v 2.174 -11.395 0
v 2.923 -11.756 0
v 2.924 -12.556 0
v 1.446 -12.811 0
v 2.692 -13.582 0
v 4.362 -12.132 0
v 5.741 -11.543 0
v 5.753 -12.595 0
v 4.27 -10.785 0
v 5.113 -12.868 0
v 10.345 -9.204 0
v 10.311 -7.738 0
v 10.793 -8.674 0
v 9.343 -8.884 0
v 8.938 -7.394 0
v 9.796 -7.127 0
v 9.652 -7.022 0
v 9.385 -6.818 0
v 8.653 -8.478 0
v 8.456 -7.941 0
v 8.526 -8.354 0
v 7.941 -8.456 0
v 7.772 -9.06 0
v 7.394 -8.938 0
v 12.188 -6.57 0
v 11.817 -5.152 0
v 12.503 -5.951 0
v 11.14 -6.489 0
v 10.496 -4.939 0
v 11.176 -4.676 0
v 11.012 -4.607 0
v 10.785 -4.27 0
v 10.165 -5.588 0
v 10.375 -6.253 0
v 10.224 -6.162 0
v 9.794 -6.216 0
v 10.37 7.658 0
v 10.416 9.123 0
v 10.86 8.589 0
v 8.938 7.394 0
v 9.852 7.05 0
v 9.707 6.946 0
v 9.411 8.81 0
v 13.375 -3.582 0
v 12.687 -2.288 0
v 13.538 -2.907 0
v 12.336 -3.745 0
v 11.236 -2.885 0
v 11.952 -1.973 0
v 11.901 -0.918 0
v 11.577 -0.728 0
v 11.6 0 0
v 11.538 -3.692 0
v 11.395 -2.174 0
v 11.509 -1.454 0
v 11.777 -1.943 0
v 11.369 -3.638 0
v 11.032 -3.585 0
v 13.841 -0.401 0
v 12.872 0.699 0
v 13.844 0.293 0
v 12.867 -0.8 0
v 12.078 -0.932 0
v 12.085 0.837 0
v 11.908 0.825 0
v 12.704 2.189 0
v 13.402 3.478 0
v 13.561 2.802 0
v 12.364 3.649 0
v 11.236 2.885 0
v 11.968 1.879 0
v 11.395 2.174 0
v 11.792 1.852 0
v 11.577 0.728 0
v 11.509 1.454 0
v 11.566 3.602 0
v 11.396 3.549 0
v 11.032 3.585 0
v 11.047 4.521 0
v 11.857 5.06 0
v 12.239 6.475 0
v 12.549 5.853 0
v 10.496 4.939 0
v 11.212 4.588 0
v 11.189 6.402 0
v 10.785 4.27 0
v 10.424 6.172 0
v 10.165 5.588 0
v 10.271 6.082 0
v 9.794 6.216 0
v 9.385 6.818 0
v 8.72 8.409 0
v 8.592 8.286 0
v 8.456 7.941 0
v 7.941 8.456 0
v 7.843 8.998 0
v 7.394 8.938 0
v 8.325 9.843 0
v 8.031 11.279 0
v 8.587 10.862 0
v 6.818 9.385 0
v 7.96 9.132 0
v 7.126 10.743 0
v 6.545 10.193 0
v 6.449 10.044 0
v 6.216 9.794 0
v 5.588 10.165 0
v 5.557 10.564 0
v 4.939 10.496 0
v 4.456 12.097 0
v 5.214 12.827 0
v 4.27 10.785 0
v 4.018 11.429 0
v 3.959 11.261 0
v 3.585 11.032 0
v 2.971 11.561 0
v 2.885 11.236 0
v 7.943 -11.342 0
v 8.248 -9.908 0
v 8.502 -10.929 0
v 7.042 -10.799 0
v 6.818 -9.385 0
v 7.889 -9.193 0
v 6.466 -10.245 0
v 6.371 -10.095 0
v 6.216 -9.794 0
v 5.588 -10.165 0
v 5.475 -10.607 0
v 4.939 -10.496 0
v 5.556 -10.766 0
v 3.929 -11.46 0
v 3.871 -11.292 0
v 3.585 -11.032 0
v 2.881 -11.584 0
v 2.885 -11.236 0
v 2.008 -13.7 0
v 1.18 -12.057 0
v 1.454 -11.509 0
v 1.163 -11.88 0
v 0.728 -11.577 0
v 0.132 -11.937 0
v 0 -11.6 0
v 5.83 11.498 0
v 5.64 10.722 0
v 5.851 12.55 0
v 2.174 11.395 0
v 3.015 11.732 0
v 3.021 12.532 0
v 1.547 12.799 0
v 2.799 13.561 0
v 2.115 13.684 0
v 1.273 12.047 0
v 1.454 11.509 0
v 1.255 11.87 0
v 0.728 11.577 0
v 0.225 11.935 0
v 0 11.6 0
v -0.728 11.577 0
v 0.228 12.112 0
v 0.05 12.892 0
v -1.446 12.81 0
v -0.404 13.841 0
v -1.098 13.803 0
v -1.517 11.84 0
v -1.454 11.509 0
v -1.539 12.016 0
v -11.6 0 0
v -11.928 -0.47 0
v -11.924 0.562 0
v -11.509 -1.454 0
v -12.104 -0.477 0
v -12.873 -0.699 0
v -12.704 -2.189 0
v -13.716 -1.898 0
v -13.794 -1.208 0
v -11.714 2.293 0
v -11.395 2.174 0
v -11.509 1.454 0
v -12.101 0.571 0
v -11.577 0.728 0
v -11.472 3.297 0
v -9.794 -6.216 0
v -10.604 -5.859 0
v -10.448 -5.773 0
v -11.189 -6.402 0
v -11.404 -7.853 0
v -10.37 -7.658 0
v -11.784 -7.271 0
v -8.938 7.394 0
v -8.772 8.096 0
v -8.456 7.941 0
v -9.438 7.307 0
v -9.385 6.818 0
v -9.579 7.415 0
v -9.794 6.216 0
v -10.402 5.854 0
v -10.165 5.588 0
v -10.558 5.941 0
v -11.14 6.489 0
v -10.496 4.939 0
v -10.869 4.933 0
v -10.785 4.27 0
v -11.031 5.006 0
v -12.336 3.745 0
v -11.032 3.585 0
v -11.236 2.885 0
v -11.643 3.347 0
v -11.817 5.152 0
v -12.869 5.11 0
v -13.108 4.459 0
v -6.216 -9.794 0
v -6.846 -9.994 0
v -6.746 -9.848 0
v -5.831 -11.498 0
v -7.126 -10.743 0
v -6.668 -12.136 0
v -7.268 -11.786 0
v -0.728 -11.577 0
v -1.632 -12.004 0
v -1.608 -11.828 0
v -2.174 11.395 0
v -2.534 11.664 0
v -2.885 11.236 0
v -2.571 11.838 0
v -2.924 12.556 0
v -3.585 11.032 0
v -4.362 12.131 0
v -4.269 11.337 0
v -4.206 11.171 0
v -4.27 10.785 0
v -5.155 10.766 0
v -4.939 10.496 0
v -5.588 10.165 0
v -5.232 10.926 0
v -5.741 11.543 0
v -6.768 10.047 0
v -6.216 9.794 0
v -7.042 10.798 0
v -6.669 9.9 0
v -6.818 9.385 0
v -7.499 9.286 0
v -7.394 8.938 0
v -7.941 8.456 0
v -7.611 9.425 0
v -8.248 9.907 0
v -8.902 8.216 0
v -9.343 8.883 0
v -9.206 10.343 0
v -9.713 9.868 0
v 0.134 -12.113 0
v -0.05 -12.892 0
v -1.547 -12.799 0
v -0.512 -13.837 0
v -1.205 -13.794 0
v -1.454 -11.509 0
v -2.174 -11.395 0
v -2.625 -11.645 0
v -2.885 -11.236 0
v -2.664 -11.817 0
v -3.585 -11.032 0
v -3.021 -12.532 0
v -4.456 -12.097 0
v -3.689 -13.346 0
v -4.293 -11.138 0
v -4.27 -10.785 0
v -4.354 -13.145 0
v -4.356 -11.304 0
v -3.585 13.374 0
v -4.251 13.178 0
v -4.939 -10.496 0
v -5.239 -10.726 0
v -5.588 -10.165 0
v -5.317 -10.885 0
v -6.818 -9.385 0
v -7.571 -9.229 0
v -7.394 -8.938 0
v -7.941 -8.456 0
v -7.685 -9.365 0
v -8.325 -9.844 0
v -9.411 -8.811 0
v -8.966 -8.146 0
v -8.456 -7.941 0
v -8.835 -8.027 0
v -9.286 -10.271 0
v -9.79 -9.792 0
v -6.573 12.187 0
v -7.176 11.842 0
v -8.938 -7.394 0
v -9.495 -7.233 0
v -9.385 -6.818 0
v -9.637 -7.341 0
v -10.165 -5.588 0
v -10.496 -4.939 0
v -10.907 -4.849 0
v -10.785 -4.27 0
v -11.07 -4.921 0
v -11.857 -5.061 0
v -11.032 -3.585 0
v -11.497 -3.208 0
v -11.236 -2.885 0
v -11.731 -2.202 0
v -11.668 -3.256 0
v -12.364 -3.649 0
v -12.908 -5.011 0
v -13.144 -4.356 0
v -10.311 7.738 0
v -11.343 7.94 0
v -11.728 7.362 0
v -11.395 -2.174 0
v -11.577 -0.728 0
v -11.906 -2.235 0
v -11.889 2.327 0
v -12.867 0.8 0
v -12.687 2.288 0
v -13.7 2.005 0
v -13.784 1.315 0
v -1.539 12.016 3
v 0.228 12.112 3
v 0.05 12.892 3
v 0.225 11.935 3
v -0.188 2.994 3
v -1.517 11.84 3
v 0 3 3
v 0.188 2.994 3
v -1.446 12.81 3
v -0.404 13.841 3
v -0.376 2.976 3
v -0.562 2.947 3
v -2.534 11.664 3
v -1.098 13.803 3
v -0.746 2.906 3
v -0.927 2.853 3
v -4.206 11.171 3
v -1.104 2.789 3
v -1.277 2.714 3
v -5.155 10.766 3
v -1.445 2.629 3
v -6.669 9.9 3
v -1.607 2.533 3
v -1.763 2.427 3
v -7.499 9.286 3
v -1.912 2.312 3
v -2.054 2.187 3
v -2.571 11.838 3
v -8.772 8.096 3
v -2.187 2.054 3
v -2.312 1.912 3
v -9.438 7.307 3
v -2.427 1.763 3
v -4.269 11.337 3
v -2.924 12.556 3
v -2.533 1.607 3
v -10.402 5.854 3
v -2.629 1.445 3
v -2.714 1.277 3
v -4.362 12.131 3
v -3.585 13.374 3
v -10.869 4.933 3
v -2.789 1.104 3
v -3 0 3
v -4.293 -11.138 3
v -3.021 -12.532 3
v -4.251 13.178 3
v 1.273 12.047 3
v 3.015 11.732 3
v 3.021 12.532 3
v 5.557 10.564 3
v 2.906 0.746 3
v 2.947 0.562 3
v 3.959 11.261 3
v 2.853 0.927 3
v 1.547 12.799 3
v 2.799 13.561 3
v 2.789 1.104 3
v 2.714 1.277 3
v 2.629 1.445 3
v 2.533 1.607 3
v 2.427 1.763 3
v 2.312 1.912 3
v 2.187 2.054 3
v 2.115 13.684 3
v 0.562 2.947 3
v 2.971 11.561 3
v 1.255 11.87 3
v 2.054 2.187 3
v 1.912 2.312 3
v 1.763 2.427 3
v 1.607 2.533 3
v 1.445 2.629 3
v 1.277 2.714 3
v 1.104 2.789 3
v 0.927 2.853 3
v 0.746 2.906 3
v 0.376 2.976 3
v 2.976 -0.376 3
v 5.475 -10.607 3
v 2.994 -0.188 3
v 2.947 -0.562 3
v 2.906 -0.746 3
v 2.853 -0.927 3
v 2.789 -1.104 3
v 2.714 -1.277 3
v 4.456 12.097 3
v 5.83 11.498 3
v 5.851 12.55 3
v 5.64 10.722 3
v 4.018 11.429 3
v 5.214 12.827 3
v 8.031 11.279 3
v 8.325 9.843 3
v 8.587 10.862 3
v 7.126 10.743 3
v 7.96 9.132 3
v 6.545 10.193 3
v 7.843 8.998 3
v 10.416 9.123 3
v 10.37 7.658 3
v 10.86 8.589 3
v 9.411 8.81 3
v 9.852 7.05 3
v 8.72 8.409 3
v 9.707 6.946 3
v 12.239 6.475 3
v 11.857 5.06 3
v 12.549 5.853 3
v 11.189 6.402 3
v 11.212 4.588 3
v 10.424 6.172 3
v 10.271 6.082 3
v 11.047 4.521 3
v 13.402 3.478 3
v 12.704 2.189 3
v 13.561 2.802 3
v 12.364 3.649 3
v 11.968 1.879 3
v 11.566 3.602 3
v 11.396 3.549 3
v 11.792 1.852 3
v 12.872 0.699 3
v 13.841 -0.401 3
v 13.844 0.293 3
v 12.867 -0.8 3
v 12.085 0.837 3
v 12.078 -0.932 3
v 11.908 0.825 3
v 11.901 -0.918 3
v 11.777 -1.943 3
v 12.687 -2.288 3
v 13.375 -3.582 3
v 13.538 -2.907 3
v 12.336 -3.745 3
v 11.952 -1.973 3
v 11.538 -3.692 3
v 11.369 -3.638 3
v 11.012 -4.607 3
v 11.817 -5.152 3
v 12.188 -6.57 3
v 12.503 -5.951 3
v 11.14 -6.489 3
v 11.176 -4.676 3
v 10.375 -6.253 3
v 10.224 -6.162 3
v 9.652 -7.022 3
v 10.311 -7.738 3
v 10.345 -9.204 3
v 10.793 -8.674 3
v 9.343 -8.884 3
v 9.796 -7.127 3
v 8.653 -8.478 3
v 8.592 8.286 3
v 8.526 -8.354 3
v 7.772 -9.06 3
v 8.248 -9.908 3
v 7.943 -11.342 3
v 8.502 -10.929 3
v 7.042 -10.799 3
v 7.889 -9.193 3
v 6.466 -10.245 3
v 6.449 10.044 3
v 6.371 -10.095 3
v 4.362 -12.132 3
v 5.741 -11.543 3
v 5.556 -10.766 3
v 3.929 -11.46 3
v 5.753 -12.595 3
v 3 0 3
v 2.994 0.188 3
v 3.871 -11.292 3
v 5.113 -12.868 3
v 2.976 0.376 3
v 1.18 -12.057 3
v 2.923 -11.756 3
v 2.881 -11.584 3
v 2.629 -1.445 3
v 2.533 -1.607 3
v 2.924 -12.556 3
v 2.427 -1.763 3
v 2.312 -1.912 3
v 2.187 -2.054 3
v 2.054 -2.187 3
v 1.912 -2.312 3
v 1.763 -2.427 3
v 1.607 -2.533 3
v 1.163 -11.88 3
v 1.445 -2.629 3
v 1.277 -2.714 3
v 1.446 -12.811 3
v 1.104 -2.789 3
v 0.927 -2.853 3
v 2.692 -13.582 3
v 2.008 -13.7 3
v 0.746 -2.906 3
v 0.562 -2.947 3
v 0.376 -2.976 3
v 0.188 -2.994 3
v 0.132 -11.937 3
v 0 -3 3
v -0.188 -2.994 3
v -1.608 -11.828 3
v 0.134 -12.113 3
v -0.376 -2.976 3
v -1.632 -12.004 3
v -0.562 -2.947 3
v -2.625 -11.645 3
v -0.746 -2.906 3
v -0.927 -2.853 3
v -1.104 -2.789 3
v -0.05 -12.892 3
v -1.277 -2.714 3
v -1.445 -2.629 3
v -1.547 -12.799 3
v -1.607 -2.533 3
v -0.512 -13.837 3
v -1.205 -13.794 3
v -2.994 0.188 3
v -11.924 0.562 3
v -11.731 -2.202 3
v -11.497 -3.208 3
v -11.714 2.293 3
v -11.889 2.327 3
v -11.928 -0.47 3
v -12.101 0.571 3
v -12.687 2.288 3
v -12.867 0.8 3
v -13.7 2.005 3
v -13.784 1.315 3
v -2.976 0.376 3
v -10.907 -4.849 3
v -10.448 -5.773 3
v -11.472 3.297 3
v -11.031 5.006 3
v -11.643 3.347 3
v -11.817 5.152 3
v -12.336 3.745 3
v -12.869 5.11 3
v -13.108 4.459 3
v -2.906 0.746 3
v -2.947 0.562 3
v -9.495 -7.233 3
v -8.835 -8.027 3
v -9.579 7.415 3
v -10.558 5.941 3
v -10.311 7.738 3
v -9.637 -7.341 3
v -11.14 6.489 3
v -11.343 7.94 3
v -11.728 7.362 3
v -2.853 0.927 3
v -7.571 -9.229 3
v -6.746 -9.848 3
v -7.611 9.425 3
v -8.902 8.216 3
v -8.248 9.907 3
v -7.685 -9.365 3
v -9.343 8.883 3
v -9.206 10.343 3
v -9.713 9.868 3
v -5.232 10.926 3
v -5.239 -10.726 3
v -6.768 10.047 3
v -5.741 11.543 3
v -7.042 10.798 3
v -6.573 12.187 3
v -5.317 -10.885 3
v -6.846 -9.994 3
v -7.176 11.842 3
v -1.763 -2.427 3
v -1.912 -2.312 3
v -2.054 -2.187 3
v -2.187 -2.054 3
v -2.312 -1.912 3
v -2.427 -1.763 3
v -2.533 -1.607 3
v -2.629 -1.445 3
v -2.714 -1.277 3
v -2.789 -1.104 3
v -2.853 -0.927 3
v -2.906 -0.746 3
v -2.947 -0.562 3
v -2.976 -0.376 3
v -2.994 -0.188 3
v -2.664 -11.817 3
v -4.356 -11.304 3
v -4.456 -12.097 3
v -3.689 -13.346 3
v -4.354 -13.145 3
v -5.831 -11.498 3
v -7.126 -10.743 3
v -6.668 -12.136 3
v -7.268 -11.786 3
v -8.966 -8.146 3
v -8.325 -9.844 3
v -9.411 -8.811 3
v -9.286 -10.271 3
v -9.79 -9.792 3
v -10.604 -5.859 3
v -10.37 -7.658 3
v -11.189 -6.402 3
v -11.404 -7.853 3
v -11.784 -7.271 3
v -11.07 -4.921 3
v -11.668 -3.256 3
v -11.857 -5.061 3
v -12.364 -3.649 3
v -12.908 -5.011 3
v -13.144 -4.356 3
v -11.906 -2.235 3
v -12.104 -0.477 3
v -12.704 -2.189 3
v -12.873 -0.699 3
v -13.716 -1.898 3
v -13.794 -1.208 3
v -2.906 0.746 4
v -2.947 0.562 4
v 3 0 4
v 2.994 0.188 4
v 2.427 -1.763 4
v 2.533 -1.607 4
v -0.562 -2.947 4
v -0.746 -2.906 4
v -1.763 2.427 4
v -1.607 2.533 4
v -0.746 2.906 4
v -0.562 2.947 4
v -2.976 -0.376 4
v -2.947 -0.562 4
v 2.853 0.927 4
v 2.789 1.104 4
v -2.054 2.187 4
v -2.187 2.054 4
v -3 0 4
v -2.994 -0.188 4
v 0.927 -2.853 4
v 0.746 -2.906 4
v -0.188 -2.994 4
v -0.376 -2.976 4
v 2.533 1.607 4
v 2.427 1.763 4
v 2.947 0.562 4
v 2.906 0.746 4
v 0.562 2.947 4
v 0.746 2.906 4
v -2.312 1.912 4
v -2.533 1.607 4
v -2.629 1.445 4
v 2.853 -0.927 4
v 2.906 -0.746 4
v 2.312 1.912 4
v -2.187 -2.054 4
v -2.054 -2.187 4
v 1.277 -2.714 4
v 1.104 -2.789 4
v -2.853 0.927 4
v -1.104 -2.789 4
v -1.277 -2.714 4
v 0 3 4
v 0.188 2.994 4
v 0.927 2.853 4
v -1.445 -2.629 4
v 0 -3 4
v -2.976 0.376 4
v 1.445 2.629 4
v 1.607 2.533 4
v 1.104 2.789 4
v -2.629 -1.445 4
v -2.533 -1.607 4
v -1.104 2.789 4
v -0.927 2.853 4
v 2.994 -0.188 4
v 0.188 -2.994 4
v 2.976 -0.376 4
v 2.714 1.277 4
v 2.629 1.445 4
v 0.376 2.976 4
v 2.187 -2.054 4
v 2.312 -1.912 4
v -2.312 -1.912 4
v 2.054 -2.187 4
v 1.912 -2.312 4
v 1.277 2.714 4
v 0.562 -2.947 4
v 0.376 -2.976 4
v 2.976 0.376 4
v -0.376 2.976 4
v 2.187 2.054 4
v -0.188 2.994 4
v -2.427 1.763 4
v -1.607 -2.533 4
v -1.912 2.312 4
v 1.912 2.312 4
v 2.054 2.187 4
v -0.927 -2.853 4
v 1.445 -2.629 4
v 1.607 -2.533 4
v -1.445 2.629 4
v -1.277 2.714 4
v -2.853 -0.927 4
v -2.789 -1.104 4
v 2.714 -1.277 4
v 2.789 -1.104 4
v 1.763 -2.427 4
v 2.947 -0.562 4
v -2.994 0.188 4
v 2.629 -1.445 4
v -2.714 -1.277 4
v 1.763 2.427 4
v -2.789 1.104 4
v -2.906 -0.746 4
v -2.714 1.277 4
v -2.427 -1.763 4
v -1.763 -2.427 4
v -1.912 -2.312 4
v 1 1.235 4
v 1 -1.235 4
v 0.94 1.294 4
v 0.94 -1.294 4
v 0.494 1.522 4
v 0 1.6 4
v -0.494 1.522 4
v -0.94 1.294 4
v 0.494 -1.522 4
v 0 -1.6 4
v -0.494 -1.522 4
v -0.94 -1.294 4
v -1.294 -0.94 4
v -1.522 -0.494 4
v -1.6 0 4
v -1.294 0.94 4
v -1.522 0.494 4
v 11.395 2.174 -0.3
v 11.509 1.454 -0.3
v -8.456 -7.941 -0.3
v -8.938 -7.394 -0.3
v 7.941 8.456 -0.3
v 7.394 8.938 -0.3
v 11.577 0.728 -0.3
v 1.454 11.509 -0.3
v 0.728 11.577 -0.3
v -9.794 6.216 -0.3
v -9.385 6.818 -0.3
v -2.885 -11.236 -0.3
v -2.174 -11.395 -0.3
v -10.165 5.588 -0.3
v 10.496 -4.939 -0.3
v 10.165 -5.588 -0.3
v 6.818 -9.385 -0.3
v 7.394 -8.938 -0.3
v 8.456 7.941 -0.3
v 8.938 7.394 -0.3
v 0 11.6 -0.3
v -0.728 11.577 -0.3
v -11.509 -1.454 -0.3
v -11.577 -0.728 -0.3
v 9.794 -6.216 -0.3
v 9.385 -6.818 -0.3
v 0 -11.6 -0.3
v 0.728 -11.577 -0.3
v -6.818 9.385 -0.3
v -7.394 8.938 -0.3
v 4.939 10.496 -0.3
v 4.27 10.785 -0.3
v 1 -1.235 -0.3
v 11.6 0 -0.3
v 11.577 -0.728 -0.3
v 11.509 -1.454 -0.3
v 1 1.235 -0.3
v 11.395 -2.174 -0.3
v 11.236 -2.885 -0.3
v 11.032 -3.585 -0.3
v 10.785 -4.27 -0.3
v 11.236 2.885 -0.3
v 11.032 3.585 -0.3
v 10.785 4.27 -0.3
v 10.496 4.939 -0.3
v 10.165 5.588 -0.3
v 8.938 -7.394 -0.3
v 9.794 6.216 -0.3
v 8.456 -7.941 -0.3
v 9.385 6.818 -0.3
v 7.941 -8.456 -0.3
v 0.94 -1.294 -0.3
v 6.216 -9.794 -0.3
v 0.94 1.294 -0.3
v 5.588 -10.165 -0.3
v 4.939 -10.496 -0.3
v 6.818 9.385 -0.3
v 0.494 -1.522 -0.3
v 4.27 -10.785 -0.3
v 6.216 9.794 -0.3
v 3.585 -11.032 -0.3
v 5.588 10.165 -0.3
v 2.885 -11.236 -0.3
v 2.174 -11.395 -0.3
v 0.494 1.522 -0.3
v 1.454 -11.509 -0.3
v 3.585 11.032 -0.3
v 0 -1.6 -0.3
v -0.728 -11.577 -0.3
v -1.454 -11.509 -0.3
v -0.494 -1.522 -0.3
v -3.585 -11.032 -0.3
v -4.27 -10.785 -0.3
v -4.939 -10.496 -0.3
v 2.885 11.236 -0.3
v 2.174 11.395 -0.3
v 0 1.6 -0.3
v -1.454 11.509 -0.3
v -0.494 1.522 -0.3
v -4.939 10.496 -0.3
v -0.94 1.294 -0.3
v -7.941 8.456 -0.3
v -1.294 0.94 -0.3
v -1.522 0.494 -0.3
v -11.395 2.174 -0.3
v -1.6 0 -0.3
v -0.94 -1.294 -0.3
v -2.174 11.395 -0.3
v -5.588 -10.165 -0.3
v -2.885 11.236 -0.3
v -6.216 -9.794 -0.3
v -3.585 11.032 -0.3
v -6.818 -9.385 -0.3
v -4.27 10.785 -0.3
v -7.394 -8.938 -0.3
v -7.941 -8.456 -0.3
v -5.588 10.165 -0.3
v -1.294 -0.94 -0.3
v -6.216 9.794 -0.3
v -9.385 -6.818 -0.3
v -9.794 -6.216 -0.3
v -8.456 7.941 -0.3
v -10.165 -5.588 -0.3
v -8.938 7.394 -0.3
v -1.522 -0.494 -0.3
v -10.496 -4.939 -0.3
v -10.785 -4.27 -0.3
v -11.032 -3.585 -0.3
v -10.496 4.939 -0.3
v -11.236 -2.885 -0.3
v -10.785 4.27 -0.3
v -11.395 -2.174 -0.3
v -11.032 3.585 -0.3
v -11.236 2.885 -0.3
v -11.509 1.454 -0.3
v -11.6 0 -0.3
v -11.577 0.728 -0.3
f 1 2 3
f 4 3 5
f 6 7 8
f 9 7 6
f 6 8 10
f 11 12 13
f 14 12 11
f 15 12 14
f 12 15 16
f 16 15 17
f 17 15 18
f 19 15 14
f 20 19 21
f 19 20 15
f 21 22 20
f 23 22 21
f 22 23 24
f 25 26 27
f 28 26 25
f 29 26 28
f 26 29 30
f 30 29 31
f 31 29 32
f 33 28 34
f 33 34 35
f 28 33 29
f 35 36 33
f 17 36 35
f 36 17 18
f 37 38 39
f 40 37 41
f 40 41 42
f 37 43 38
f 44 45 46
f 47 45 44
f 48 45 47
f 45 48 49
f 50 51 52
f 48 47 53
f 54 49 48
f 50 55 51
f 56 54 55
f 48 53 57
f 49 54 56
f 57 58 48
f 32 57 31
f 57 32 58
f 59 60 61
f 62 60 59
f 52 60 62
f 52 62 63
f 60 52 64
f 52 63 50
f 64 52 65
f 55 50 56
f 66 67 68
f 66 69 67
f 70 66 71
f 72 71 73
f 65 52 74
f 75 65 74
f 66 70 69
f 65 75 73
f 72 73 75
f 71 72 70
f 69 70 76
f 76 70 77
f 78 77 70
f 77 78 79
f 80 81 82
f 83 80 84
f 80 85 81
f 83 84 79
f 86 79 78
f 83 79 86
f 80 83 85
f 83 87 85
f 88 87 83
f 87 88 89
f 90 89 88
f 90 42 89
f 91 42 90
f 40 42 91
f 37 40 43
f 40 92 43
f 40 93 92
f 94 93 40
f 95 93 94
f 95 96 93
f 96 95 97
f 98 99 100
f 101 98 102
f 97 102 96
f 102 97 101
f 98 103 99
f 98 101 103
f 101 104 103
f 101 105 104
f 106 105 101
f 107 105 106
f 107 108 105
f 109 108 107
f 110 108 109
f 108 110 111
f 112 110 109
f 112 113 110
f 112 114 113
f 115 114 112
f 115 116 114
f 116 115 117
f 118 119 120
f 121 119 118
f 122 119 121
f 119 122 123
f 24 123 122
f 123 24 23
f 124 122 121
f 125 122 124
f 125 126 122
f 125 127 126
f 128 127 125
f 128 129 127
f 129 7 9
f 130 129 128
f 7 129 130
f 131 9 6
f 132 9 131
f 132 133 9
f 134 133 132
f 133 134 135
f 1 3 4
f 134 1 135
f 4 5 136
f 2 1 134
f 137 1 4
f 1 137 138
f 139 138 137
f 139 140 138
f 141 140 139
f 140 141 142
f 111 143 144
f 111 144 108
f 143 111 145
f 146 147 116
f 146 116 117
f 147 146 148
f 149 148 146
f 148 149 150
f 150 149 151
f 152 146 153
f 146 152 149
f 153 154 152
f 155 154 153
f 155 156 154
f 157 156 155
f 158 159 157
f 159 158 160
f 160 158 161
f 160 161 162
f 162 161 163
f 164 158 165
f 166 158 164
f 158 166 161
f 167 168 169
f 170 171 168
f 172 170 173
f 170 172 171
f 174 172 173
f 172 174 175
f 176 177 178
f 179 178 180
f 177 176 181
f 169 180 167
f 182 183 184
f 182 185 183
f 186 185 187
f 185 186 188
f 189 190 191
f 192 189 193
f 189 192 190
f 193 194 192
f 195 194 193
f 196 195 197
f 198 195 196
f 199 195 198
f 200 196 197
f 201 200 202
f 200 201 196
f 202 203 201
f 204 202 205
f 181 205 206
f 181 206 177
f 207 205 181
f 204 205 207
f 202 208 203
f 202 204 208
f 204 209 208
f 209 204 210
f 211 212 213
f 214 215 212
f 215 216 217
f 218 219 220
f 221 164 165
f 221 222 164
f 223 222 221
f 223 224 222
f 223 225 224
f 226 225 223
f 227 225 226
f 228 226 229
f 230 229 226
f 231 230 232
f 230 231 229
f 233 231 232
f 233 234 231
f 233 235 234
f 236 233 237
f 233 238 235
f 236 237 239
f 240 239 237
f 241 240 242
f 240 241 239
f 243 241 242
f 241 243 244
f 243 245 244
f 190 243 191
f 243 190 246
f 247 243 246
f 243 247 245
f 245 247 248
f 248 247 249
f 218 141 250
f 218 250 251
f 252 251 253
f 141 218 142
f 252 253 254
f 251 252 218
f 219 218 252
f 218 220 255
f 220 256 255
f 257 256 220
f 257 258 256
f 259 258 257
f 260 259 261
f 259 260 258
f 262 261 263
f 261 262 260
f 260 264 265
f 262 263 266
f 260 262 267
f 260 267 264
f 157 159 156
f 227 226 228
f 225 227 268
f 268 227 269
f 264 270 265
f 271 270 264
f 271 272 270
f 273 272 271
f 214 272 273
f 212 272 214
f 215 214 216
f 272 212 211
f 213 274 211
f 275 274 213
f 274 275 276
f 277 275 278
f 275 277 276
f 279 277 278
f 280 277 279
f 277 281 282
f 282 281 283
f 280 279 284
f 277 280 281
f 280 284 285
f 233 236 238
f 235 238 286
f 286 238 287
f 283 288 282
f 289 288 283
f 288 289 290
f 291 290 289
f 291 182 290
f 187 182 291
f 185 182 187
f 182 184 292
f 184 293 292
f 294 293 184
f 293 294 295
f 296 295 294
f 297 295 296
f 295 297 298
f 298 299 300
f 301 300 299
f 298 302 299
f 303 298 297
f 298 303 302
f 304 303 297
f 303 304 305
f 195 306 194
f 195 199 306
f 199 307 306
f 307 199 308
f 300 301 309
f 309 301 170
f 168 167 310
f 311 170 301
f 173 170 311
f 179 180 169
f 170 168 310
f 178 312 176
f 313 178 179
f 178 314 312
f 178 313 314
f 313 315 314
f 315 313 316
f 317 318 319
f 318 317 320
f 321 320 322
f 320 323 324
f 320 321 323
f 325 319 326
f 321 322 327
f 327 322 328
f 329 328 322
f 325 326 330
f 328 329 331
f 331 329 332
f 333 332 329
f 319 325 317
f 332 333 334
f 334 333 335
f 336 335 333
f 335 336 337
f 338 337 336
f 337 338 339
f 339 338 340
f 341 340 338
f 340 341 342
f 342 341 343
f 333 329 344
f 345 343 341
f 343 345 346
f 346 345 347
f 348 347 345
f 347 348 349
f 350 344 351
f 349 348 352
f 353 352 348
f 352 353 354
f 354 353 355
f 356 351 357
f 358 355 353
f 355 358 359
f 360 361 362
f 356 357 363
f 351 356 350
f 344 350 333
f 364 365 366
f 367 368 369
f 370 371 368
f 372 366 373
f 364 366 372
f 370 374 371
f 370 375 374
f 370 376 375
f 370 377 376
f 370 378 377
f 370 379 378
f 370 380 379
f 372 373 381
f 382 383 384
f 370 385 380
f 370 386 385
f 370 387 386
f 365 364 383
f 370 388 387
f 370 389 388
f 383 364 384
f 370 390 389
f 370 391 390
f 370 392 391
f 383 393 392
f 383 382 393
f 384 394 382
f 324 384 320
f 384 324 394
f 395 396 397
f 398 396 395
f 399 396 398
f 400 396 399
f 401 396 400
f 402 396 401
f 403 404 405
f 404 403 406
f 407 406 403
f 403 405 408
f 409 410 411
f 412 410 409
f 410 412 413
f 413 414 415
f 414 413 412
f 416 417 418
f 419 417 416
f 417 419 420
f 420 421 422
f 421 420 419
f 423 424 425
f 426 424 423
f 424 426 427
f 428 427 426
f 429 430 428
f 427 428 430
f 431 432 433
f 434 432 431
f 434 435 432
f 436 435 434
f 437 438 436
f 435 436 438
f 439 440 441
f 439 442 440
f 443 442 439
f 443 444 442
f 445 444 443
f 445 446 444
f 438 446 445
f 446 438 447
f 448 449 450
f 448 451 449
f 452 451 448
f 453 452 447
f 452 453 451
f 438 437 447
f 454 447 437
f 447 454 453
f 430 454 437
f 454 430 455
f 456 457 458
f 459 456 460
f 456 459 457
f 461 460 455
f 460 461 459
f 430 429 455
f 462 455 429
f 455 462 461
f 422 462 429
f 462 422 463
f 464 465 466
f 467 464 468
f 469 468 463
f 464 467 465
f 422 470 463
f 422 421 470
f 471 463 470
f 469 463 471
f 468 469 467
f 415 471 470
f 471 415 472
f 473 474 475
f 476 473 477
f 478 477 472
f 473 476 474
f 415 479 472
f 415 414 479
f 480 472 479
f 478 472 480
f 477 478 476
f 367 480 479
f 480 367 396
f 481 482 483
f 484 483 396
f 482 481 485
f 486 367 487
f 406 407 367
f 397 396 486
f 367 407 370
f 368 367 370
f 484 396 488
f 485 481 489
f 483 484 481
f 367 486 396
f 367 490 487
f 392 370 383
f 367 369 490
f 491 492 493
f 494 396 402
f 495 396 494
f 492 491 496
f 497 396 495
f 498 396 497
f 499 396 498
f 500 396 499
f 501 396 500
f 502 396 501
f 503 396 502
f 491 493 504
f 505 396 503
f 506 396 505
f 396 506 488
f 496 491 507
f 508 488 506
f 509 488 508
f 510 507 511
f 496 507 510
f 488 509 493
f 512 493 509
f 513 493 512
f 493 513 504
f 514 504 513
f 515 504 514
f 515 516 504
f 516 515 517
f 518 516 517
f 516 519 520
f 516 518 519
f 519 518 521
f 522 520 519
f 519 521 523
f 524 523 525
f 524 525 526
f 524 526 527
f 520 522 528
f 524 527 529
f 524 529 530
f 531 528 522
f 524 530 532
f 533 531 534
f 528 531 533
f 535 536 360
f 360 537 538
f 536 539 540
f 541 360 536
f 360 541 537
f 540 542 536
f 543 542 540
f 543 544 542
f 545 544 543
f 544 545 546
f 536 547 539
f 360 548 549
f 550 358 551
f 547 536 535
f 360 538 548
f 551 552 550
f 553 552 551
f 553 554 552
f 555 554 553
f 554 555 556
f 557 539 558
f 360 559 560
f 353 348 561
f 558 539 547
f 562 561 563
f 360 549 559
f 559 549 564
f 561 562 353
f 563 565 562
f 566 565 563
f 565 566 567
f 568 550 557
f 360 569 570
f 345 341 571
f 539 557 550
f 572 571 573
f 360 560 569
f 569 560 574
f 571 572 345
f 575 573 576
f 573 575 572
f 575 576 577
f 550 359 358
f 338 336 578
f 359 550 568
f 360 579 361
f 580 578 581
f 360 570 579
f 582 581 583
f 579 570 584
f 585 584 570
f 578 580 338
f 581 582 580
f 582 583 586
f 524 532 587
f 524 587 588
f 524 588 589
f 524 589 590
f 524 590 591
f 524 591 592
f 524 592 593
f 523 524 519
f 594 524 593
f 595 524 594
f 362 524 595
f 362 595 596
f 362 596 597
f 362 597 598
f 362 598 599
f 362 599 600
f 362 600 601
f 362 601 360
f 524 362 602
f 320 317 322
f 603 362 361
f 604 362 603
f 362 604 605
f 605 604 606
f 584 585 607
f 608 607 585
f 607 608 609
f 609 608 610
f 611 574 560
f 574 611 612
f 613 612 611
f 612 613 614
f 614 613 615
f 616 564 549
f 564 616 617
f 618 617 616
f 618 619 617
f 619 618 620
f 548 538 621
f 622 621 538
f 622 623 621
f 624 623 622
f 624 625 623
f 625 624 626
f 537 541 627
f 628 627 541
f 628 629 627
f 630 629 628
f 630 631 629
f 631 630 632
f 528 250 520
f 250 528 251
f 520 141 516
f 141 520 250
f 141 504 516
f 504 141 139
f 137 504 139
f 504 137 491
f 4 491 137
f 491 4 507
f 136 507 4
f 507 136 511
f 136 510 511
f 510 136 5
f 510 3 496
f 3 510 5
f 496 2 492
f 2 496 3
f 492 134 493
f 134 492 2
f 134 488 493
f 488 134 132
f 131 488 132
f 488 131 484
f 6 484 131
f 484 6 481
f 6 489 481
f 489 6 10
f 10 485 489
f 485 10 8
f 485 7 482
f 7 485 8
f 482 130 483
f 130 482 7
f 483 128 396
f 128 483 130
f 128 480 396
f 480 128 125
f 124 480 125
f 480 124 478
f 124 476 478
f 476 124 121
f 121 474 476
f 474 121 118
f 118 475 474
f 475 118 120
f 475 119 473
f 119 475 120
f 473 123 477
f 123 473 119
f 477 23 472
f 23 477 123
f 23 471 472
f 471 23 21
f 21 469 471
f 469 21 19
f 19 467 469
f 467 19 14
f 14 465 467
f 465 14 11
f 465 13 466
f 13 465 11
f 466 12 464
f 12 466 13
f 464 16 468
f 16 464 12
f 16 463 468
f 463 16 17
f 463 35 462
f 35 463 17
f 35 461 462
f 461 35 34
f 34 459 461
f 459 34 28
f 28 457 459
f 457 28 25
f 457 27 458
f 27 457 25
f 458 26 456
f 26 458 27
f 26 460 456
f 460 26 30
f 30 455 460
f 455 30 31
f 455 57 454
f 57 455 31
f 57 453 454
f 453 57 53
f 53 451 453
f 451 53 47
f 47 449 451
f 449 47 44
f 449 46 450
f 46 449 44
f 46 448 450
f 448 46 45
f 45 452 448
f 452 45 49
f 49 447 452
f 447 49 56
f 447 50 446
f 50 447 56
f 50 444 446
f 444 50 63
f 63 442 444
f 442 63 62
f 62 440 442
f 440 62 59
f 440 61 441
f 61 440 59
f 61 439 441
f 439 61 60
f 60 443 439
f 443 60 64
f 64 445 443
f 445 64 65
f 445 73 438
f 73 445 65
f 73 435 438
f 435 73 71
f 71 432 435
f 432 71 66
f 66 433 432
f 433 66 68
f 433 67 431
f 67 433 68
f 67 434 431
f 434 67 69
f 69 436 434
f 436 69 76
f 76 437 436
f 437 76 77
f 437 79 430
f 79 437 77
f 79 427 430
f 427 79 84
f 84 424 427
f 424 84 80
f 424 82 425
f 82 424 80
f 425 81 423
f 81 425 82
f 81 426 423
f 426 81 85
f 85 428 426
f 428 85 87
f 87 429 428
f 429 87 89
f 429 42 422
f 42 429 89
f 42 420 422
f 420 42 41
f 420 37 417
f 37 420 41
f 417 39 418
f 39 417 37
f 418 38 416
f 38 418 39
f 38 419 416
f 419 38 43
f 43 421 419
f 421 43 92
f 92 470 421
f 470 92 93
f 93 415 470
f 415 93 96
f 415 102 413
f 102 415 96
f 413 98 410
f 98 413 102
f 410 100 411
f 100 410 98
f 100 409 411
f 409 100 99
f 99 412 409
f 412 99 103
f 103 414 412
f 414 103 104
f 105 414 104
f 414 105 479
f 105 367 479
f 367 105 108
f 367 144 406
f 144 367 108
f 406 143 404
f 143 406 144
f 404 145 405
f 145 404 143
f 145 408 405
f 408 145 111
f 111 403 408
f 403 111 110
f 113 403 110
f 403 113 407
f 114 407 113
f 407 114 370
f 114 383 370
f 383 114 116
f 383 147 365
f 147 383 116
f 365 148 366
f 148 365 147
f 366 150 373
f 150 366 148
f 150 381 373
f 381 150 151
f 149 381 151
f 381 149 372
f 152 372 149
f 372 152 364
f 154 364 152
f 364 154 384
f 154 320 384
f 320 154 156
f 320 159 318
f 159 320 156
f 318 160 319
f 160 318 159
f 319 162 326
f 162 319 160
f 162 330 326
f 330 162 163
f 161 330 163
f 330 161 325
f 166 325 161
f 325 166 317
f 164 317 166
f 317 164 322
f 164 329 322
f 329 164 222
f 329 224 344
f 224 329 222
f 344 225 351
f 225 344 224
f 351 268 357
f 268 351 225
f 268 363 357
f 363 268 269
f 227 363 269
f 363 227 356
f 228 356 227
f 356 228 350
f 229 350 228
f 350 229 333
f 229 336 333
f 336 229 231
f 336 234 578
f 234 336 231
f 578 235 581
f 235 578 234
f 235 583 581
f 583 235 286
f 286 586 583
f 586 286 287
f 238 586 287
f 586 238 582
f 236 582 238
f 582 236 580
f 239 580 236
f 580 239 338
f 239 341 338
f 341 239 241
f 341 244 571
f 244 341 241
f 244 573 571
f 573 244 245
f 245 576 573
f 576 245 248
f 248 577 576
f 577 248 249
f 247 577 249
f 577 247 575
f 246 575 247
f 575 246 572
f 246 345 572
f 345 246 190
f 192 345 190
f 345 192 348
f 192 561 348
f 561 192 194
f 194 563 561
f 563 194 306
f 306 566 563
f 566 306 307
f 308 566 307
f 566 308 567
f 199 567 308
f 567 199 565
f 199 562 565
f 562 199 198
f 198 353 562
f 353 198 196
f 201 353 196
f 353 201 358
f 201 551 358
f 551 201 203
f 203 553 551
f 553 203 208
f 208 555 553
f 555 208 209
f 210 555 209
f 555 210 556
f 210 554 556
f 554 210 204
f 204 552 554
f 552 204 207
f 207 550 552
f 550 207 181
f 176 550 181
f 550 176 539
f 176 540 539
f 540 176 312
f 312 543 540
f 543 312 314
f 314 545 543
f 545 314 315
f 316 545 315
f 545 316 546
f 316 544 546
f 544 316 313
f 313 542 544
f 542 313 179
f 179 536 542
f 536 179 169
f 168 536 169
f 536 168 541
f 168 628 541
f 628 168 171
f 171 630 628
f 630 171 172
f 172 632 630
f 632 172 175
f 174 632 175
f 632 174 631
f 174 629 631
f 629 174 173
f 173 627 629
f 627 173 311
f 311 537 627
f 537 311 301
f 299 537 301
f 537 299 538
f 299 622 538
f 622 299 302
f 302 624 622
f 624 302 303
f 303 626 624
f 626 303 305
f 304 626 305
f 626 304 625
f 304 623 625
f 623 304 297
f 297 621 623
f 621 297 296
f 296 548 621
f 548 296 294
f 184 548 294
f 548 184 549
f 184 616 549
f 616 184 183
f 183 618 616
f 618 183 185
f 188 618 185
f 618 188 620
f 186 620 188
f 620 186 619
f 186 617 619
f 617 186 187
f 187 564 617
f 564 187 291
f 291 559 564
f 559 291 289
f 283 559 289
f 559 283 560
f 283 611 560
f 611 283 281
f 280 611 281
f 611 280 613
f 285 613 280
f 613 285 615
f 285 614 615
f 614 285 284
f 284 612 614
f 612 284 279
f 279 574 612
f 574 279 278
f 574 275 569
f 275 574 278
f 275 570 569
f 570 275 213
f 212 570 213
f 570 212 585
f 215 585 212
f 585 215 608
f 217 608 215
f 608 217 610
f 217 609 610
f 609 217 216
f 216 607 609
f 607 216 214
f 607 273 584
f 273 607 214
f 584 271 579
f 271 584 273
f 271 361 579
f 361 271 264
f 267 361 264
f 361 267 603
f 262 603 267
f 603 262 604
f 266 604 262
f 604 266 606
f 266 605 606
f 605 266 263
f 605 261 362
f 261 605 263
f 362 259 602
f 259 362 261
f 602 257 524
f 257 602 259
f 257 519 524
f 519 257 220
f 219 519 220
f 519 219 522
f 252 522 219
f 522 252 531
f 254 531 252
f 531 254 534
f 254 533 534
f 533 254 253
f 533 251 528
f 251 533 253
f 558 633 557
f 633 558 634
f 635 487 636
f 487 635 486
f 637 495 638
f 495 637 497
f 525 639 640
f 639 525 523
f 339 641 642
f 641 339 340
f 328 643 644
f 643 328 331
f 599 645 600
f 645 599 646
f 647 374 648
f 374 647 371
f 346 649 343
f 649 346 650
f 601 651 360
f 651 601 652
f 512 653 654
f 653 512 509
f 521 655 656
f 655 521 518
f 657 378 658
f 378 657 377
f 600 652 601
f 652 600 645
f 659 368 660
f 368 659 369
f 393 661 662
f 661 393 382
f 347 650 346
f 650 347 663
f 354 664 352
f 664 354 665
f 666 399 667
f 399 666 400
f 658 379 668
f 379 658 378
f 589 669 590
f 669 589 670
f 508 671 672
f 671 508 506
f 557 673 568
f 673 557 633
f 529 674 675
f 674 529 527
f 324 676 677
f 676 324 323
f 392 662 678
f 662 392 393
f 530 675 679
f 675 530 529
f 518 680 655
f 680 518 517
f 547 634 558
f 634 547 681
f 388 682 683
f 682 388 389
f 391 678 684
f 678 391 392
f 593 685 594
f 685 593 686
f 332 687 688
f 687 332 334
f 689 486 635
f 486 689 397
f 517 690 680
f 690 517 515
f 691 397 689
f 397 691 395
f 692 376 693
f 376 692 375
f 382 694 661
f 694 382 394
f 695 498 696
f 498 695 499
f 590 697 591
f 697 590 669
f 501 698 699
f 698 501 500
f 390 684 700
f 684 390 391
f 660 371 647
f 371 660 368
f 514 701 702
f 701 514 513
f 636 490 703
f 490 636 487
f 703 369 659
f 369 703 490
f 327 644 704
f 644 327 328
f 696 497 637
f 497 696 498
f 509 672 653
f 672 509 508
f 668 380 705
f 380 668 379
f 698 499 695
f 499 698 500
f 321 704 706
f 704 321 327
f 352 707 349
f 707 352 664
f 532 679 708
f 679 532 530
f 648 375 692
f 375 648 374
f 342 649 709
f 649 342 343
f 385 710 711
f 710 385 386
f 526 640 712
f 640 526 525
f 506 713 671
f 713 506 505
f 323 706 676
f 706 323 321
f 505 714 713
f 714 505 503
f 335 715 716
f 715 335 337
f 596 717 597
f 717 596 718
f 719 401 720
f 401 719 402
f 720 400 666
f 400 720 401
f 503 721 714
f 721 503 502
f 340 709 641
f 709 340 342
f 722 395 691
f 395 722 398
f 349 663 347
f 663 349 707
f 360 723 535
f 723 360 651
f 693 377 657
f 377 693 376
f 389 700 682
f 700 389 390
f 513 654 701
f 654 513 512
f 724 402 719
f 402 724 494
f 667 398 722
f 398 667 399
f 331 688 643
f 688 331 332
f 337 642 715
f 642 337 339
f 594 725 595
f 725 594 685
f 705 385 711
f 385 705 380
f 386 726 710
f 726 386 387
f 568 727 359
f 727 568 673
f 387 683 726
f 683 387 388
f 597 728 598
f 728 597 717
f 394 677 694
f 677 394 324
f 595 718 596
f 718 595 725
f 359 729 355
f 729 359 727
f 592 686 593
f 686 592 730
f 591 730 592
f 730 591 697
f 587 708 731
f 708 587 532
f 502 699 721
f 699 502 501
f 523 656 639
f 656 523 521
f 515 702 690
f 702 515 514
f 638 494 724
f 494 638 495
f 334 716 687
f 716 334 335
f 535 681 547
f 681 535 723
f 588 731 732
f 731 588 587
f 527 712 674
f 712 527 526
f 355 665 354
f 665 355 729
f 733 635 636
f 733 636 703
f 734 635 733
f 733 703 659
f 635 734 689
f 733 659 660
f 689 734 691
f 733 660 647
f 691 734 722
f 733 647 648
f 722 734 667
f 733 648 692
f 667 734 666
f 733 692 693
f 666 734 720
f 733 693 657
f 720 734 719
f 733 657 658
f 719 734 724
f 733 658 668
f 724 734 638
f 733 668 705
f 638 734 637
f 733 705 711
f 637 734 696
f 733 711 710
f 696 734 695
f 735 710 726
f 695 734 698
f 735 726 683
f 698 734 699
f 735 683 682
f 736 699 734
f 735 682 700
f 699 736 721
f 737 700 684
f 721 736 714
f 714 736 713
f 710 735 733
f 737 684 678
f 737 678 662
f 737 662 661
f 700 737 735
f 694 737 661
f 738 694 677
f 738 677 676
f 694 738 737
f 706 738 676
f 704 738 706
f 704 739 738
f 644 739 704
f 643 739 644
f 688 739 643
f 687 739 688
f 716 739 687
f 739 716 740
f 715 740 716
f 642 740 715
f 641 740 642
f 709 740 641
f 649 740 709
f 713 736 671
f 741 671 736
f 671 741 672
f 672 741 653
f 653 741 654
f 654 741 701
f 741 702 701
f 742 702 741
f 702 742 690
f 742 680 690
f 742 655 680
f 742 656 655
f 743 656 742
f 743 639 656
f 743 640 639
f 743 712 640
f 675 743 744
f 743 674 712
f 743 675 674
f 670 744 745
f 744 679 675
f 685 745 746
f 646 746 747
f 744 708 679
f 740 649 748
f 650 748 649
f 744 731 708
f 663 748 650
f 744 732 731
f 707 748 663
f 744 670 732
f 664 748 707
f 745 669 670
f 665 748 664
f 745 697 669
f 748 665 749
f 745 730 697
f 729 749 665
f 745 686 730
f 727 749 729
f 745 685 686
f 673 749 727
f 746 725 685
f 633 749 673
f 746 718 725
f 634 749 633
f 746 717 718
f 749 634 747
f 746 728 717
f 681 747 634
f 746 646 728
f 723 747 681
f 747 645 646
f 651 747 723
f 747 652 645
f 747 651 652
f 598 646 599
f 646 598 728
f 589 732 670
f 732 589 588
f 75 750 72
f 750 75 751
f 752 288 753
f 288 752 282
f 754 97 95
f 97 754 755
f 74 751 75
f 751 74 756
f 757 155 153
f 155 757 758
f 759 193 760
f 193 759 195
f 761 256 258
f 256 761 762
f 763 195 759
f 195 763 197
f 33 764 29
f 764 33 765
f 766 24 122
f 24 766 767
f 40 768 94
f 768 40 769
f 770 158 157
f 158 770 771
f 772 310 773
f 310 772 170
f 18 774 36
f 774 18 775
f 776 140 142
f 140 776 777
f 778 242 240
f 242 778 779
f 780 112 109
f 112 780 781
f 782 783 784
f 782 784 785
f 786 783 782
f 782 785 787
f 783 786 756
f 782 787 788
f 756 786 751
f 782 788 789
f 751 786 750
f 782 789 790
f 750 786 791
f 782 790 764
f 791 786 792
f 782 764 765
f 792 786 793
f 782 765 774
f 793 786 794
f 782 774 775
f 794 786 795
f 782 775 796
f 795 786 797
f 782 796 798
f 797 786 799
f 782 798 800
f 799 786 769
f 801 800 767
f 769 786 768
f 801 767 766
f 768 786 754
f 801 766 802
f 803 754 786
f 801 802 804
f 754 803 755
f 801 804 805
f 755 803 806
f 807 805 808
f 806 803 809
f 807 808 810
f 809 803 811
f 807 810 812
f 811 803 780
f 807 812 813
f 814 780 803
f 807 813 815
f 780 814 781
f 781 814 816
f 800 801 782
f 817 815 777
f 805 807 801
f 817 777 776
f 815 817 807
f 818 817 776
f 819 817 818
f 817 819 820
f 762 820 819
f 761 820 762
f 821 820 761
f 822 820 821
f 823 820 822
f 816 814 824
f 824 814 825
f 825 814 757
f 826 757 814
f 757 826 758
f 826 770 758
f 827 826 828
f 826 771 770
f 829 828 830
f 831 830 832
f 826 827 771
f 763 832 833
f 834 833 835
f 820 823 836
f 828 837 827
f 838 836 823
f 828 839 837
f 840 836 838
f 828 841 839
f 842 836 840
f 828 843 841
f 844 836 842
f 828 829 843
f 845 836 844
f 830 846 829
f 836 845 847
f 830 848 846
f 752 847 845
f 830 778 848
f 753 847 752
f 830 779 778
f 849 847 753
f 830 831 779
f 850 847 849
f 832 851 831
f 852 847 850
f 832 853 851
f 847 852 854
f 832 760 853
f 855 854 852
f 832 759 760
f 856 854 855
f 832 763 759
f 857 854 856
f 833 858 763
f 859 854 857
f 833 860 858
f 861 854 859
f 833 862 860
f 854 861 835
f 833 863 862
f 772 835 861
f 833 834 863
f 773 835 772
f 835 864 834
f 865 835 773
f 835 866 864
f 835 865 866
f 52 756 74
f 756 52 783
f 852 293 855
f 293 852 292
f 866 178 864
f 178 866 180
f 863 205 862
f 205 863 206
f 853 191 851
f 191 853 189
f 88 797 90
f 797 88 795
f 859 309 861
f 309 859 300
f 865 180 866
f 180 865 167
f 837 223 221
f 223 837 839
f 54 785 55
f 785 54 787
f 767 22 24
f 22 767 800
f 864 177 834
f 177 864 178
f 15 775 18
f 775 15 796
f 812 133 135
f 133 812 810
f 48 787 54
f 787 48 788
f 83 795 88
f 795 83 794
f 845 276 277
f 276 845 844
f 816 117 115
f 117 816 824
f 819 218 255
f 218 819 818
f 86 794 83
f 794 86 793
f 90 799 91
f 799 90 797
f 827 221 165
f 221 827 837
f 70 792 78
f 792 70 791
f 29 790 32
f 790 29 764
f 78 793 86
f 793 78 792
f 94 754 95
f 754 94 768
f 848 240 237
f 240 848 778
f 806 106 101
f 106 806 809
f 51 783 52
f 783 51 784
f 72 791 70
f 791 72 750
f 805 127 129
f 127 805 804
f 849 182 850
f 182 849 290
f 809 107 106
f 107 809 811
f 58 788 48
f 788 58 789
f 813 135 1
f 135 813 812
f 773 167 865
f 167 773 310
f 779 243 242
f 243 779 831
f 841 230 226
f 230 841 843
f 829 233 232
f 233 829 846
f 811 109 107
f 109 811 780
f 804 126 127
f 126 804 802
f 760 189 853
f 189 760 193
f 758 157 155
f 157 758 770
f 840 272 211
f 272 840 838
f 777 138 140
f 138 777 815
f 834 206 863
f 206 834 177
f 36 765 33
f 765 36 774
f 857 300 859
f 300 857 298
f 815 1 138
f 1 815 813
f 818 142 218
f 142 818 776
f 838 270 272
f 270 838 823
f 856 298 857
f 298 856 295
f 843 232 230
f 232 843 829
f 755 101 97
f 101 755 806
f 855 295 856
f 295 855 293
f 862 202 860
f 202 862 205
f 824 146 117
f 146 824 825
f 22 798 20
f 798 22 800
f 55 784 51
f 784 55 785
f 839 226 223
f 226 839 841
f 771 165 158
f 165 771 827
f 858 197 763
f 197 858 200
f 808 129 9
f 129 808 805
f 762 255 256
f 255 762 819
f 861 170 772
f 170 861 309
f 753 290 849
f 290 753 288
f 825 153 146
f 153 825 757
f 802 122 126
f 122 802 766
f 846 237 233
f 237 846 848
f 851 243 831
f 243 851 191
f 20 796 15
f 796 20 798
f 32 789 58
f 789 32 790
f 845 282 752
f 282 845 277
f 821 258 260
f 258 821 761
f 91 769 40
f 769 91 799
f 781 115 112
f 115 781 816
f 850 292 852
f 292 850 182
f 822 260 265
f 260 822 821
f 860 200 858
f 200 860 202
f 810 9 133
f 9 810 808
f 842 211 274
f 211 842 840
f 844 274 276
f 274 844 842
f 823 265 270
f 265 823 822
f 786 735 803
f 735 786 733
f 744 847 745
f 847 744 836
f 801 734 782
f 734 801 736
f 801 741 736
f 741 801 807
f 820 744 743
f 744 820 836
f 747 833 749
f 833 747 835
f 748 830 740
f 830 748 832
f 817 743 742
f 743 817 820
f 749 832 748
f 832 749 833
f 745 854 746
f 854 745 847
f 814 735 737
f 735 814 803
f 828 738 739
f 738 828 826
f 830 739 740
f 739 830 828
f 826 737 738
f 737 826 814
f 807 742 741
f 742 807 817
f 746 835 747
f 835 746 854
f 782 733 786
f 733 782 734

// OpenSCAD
// Погрешности размеров отверстий подобраны для печати
// на Picaso 3D Builder с максимальным качеством 100% заполнения

// шестерня на вал мотора
// шестерня t9 на 3D Designer печатается с отверстием 2.4
// и при этом налезает на вал (с отверстием 0.2 расползается,
// хотя 2.2 меньше, чем 2.4 - так работает слайсер)
//gear_motor(print_error=0.2); // diam=2.4

// передача от мотора к колесу
//gear_transmission(print_error=0.2);

// шестерня на колесо
gear_wheel(print_error=0.1);

// Печатать с минимальной скоростью (по крайней мере мелкие t8 и t9),
// 100% заполнение, 
// тонкая настройка качества печати: обрамление детали=Нет

/** 
 * Шестеренка на вал мотора.
 * 9 зубов, шаг 1.5мм, угол зацепления 20, 
 * отверстие: круглый вал 2мм
 *
 * @param print_error погрешность при печати 3д-принтером (мм), стоит 
 * учитывать для элементов (отверстий или штырей), стыкующихся с 
 * внешними объектами (отверстие для вала при печати получится меньше
 * и в него без учета погрешности может быть будет сложно втиснуть ось)
 */
module gear_motor(print_error=0.2) {
  difference() {
    union() {
      // шестеренка
      linear_extrude(height=5) import(file="gear-pa20-cp1.5-t9.dxf");

      // подсадка, чтобы не расплывались зубья
      // для cp1.5-t9
      //translate([0, 0, -0.3]) cylinder(h=1, r=5.7, $fn=100);
    }

    // ось
    generic_axis(radius=1, print_error=print_error);
  }
}

/** 
 * Передача с вала на колесо (две шестерни).
 * 
 * шестерня 1: 61 зуб, шаг 1.5мм, угол зацепления 20 
 * шестерня 2: 23 зубов, шаг 3мм, угол зацепления 20
 * отверстие: круглый вал 2мм
 *
 * @param print_error погрешность при печати 3д-принтером (мм), стоит 
 * учитывать для элементов (отверстий или штырей), стыкующихся с 
 * внешними объектами (отверстие для вала при печати получится меньше
 * и в него без учета погрешности может быть будет сложно втиснуть ось)
 */
module gear_transmission() {
    difference() {
    union() {
      // шестеренка 1
      linear_extrude(height=3) import(file="gear-pa20-cp1.5-t61.dxf");
      // шестеренка 2
      translate([0, 0, 2]) 
        linear_extrude(height=6) import(file="gear-pa20-cp3-t13.dxf");

      // кругляш на макушке вокруг оси, чтобы упираться в стенку
      translate([0, 0, 7.9]) cylinder(h=0.6, r=3, $fn=100);

      // подсадка, чтобы не расплывались зубья
      translate([0, 0, -0.3]) cylinder(h=1, r=13.8, $fn=100);
    }

    // ось
    generic_axis(radius=1, print_error=print_error);
  }
}

/** 
 * Шестеренка на колесо.
 * 
 * 13 зубов, шаг 3мм, угол зацепления 20
 * отверстие - круглый вал 3мм с лыской (0.9мм от центра)
 *
 * @param print_error погрешность при печати 3д-принтером (мм), стоит 
 * учитывать для элементов (отверстий или штырей), стыкующихся с 
 * внешними объектами (отверстие для вала при печати получится меньше
 * и в него без учета погрешности может быть будет сложно втиснуть ось)
 */
module gear_wheel() {
  difference() {
    union() {
      // шестеренка
      linear_extrude(height=3) import(file="gear-pa20-cp3-t27.dxf");

      // кругляш на макушке вокруг оси, чтобы упираться в стенку
      translate([0, 0, 2.9]) cylinder(h=1.1, r=3, $fn=100);

      // подсадка, чтобы не расплывались зубья
      translate([0, 0, -0.3]) cylinder(h=1, r=11.6, $fn=100);
    }

    // ось с лыской
    motor2_axis(print_error=print_error);
  }
}


/**
 * Просто круглая ось, по умолчанию диаметр 3мм.
 *
 * @param print_error погрешность при печати 3д-принтером (мм), стоит 
 * учитывать для элементов (отверстий или штырей), стыкующихся с 
 * внешними объектами (отверстие для вала при печати получится меньше
 * и в него без учета погрешности может быть будет сложно втиснуть ось)
 */
module generic_axis(length=22, radius=1.5, print_error=0) {
  translate([0,0,-1])
    cylinder(h=length, r=radius+print_error, $fn=20);
}


/** 
 * Ось для для мотора 2:
 * Pololu 4.5V, 80rpm Right Angle (прямой, желтый)
 * www.robotshop.com/en/solarbotics-gm7-gear-motor-7.html
 *
 * @param radius радиус оси, диаметр оси мотора 3мм; 
 * @param cut_radius расстояние от центра до среза 
 * @param print_error погрешность при печати 3д-принтером (мм), стоит учитывать 
 * для элементов (отверстий или штырей), стыкующихся с 
 * внешними объектами (отверстие для вала при печати получится меньше
 * и в него без учета погрешности может быть будет сложно втиснуть ось)
 */
module motor2_axis(length=22, radius=1.5, cut_radius=0.9, print_error=0) {
  // диаметр 3мм, срез с одного бока 0.3мм
  translate([0,0,-1])
  difference() {
    cylinder(h=length, r=radius+print_error, $fn=20);
    // 1.5 мм "вниз" по y (совместить куб с цилиндром), 
    // 0.9 мм "вправо" по x (срезать справа, cut_radius=0.9мм)
    translate([cut_radius+print_error, -1.5, 0])
      cube([2, 3, length]);
  }
}
